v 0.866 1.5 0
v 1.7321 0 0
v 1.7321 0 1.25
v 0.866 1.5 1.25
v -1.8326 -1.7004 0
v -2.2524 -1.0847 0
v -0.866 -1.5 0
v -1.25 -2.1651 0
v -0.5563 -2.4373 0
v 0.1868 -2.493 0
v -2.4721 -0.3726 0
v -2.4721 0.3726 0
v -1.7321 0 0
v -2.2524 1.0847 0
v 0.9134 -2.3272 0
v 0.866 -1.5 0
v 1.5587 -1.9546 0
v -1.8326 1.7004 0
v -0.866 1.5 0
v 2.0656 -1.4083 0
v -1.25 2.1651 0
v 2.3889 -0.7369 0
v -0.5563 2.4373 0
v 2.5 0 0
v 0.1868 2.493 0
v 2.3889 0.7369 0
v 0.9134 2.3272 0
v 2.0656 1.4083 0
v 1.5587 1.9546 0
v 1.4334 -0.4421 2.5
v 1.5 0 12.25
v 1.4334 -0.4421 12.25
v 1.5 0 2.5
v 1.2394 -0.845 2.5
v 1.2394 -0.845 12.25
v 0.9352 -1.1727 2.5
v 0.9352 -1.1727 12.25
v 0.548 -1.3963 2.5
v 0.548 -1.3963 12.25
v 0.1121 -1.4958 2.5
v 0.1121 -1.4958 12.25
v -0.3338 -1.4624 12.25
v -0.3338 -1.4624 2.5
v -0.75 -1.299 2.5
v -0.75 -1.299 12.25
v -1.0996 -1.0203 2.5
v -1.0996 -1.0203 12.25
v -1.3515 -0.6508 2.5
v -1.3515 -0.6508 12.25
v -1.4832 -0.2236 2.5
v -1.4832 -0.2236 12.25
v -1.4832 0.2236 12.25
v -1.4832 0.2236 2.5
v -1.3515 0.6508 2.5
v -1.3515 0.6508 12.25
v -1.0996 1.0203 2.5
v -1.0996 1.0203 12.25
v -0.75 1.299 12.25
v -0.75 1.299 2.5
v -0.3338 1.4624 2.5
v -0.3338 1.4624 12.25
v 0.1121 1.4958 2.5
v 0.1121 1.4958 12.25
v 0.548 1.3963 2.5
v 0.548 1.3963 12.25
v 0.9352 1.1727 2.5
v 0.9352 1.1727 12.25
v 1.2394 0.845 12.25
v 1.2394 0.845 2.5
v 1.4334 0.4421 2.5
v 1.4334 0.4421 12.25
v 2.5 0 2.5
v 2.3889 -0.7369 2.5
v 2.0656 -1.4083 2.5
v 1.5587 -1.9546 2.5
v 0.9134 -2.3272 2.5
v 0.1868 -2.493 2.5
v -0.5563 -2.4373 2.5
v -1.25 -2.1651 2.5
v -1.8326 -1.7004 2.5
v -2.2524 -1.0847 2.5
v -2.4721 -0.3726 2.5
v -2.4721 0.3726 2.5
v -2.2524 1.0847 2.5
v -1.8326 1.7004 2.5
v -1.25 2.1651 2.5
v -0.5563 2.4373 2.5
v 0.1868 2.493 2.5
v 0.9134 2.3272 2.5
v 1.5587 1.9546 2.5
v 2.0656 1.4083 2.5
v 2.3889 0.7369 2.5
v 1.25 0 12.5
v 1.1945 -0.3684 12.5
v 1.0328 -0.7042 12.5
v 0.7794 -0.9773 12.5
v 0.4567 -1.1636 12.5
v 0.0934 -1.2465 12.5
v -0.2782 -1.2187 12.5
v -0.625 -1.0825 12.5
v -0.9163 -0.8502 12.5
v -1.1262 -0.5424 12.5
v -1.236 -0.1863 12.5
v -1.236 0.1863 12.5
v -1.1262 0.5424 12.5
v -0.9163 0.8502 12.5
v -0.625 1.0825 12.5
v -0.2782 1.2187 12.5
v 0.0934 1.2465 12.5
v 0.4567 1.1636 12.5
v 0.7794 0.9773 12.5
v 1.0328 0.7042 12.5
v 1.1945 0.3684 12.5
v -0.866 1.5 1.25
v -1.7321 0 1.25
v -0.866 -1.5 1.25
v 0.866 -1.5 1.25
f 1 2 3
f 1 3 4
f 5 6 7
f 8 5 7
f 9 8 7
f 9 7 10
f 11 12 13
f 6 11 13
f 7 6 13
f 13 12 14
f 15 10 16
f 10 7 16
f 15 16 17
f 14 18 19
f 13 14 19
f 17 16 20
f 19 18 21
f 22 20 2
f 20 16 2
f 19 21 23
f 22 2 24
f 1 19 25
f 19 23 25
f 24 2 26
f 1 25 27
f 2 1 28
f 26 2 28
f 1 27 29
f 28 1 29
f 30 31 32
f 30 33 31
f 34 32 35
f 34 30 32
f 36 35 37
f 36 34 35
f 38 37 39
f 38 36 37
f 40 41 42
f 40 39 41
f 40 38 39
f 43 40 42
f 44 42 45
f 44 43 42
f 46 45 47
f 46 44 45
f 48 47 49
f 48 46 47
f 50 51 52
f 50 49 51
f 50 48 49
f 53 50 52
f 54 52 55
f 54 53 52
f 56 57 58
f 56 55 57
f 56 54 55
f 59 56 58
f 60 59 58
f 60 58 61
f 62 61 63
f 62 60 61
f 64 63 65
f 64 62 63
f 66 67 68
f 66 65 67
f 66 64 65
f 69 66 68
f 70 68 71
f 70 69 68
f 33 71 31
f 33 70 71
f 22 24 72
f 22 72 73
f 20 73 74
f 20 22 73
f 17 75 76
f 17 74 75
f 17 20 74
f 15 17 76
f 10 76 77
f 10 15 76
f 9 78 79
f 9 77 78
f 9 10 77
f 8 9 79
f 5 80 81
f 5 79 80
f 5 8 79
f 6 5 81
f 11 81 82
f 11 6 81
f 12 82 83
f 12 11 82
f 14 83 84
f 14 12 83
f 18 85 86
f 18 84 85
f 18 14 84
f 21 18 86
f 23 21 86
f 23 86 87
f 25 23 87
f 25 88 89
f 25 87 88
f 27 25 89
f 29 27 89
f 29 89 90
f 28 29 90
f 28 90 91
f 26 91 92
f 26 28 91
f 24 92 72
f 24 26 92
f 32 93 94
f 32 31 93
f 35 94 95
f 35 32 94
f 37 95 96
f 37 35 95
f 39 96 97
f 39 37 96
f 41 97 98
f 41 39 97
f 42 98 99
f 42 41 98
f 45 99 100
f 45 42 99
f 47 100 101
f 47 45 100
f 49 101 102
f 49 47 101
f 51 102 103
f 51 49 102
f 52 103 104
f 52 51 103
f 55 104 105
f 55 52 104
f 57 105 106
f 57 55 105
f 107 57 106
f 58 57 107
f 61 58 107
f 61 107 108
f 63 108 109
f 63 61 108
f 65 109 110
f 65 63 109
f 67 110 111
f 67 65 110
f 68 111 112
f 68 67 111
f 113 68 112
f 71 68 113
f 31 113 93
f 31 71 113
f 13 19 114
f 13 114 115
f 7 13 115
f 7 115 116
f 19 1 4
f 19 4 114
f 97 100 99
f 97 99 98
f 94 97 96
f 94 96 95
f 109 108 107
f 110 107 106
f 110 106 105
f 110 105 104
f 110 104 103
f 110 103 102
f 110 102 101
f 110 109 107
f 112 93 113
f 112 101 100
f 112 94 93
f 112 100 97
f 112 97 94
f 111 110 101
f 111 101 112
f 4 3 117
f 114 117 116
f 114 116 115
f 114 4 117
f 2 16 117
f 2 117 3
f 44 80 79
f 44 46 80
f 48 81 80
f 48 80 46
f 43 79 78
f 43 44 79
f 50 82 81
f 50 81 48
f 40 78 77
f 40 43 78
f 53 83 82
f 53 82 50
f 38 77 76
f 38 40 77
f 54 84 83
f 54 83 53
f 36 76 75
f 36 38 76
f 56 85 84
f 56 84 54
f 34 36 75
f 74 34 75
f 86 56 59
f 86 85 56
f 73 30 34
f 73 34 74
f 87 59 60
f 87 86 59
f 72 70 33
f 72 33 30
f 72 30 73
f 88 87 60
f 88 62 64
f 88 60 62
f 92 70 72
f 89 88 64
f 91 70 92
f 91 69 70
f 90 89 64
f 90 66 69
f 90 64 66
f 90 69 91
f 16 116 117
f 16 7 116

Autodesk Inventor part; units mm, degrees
ref_plane "YZ Plane" through (0, 0, 0) normal (1, 0, 0) x (0, 1, 0)
ref_plane "XZ Plane" through (0, 0, 0) normal (0, 1, 0) x (-1, 0, 0)
ref_plane "XY Plane" through (0, 0, 0) normal (0, 0, 1) x (1, 0, 0)
sketch "草图1" plane through (0, 0, 0) normal (0, 0, 1) x (1, 0, 0)
  circle A0 centre (0, 0) radius 2.5
  dimension "d0" = 5
extrude "拉伸1" add sketch "草图1" along normal blind 2.5
sketch "草图2" plane through (0, 0, 2.5) normal (0, 0, 1) x (1, 0, 0)
  circle A0 centre (0, 0) radius 1.5
  dimension "d3" = 3
extrude "拉伸2" add sketch "草图2" along normal blind 10
thread "螺纹1" size "M3x0.5" class "6g" standard "ANSI Metric M Profile" full length
chamfer "倒角1" distance 0.25 angle 45 1 edges at (-1.5, 0, 12.5)
sketch "草图3" plane through (0, 0, 0) normal (0, 0, -1) x (-1, 0, 0)
  line L0 (0.866, -1.5) -> (-0.866, -1.5)
  line L1 (-0.866, -1.5) -> (-1.7321, 0)
  line L2 (-1.7321, 0) -> (-0.866, 1.5)
  line L3 (-0.866, 1.5) -> (0.866, 1.5)
  line L4 (0.866, 1.5) -> (1.7321, 0)
  line L5 (1.7321, 0) -> (0.866, -1.5)
  line L6 (0, 0) -> (0, 0.2895)
  circle A0 centre (0, 0) radius 1.5 projected
  point P0 (0, 1.5)
  dimension "d11" = 0.2895
  dimension "d12" = 1.5
extrude "拉伸3" cut sketch "草图3" against normal blind 1.25
properties part number "砂轮轴端盖螺丝"
